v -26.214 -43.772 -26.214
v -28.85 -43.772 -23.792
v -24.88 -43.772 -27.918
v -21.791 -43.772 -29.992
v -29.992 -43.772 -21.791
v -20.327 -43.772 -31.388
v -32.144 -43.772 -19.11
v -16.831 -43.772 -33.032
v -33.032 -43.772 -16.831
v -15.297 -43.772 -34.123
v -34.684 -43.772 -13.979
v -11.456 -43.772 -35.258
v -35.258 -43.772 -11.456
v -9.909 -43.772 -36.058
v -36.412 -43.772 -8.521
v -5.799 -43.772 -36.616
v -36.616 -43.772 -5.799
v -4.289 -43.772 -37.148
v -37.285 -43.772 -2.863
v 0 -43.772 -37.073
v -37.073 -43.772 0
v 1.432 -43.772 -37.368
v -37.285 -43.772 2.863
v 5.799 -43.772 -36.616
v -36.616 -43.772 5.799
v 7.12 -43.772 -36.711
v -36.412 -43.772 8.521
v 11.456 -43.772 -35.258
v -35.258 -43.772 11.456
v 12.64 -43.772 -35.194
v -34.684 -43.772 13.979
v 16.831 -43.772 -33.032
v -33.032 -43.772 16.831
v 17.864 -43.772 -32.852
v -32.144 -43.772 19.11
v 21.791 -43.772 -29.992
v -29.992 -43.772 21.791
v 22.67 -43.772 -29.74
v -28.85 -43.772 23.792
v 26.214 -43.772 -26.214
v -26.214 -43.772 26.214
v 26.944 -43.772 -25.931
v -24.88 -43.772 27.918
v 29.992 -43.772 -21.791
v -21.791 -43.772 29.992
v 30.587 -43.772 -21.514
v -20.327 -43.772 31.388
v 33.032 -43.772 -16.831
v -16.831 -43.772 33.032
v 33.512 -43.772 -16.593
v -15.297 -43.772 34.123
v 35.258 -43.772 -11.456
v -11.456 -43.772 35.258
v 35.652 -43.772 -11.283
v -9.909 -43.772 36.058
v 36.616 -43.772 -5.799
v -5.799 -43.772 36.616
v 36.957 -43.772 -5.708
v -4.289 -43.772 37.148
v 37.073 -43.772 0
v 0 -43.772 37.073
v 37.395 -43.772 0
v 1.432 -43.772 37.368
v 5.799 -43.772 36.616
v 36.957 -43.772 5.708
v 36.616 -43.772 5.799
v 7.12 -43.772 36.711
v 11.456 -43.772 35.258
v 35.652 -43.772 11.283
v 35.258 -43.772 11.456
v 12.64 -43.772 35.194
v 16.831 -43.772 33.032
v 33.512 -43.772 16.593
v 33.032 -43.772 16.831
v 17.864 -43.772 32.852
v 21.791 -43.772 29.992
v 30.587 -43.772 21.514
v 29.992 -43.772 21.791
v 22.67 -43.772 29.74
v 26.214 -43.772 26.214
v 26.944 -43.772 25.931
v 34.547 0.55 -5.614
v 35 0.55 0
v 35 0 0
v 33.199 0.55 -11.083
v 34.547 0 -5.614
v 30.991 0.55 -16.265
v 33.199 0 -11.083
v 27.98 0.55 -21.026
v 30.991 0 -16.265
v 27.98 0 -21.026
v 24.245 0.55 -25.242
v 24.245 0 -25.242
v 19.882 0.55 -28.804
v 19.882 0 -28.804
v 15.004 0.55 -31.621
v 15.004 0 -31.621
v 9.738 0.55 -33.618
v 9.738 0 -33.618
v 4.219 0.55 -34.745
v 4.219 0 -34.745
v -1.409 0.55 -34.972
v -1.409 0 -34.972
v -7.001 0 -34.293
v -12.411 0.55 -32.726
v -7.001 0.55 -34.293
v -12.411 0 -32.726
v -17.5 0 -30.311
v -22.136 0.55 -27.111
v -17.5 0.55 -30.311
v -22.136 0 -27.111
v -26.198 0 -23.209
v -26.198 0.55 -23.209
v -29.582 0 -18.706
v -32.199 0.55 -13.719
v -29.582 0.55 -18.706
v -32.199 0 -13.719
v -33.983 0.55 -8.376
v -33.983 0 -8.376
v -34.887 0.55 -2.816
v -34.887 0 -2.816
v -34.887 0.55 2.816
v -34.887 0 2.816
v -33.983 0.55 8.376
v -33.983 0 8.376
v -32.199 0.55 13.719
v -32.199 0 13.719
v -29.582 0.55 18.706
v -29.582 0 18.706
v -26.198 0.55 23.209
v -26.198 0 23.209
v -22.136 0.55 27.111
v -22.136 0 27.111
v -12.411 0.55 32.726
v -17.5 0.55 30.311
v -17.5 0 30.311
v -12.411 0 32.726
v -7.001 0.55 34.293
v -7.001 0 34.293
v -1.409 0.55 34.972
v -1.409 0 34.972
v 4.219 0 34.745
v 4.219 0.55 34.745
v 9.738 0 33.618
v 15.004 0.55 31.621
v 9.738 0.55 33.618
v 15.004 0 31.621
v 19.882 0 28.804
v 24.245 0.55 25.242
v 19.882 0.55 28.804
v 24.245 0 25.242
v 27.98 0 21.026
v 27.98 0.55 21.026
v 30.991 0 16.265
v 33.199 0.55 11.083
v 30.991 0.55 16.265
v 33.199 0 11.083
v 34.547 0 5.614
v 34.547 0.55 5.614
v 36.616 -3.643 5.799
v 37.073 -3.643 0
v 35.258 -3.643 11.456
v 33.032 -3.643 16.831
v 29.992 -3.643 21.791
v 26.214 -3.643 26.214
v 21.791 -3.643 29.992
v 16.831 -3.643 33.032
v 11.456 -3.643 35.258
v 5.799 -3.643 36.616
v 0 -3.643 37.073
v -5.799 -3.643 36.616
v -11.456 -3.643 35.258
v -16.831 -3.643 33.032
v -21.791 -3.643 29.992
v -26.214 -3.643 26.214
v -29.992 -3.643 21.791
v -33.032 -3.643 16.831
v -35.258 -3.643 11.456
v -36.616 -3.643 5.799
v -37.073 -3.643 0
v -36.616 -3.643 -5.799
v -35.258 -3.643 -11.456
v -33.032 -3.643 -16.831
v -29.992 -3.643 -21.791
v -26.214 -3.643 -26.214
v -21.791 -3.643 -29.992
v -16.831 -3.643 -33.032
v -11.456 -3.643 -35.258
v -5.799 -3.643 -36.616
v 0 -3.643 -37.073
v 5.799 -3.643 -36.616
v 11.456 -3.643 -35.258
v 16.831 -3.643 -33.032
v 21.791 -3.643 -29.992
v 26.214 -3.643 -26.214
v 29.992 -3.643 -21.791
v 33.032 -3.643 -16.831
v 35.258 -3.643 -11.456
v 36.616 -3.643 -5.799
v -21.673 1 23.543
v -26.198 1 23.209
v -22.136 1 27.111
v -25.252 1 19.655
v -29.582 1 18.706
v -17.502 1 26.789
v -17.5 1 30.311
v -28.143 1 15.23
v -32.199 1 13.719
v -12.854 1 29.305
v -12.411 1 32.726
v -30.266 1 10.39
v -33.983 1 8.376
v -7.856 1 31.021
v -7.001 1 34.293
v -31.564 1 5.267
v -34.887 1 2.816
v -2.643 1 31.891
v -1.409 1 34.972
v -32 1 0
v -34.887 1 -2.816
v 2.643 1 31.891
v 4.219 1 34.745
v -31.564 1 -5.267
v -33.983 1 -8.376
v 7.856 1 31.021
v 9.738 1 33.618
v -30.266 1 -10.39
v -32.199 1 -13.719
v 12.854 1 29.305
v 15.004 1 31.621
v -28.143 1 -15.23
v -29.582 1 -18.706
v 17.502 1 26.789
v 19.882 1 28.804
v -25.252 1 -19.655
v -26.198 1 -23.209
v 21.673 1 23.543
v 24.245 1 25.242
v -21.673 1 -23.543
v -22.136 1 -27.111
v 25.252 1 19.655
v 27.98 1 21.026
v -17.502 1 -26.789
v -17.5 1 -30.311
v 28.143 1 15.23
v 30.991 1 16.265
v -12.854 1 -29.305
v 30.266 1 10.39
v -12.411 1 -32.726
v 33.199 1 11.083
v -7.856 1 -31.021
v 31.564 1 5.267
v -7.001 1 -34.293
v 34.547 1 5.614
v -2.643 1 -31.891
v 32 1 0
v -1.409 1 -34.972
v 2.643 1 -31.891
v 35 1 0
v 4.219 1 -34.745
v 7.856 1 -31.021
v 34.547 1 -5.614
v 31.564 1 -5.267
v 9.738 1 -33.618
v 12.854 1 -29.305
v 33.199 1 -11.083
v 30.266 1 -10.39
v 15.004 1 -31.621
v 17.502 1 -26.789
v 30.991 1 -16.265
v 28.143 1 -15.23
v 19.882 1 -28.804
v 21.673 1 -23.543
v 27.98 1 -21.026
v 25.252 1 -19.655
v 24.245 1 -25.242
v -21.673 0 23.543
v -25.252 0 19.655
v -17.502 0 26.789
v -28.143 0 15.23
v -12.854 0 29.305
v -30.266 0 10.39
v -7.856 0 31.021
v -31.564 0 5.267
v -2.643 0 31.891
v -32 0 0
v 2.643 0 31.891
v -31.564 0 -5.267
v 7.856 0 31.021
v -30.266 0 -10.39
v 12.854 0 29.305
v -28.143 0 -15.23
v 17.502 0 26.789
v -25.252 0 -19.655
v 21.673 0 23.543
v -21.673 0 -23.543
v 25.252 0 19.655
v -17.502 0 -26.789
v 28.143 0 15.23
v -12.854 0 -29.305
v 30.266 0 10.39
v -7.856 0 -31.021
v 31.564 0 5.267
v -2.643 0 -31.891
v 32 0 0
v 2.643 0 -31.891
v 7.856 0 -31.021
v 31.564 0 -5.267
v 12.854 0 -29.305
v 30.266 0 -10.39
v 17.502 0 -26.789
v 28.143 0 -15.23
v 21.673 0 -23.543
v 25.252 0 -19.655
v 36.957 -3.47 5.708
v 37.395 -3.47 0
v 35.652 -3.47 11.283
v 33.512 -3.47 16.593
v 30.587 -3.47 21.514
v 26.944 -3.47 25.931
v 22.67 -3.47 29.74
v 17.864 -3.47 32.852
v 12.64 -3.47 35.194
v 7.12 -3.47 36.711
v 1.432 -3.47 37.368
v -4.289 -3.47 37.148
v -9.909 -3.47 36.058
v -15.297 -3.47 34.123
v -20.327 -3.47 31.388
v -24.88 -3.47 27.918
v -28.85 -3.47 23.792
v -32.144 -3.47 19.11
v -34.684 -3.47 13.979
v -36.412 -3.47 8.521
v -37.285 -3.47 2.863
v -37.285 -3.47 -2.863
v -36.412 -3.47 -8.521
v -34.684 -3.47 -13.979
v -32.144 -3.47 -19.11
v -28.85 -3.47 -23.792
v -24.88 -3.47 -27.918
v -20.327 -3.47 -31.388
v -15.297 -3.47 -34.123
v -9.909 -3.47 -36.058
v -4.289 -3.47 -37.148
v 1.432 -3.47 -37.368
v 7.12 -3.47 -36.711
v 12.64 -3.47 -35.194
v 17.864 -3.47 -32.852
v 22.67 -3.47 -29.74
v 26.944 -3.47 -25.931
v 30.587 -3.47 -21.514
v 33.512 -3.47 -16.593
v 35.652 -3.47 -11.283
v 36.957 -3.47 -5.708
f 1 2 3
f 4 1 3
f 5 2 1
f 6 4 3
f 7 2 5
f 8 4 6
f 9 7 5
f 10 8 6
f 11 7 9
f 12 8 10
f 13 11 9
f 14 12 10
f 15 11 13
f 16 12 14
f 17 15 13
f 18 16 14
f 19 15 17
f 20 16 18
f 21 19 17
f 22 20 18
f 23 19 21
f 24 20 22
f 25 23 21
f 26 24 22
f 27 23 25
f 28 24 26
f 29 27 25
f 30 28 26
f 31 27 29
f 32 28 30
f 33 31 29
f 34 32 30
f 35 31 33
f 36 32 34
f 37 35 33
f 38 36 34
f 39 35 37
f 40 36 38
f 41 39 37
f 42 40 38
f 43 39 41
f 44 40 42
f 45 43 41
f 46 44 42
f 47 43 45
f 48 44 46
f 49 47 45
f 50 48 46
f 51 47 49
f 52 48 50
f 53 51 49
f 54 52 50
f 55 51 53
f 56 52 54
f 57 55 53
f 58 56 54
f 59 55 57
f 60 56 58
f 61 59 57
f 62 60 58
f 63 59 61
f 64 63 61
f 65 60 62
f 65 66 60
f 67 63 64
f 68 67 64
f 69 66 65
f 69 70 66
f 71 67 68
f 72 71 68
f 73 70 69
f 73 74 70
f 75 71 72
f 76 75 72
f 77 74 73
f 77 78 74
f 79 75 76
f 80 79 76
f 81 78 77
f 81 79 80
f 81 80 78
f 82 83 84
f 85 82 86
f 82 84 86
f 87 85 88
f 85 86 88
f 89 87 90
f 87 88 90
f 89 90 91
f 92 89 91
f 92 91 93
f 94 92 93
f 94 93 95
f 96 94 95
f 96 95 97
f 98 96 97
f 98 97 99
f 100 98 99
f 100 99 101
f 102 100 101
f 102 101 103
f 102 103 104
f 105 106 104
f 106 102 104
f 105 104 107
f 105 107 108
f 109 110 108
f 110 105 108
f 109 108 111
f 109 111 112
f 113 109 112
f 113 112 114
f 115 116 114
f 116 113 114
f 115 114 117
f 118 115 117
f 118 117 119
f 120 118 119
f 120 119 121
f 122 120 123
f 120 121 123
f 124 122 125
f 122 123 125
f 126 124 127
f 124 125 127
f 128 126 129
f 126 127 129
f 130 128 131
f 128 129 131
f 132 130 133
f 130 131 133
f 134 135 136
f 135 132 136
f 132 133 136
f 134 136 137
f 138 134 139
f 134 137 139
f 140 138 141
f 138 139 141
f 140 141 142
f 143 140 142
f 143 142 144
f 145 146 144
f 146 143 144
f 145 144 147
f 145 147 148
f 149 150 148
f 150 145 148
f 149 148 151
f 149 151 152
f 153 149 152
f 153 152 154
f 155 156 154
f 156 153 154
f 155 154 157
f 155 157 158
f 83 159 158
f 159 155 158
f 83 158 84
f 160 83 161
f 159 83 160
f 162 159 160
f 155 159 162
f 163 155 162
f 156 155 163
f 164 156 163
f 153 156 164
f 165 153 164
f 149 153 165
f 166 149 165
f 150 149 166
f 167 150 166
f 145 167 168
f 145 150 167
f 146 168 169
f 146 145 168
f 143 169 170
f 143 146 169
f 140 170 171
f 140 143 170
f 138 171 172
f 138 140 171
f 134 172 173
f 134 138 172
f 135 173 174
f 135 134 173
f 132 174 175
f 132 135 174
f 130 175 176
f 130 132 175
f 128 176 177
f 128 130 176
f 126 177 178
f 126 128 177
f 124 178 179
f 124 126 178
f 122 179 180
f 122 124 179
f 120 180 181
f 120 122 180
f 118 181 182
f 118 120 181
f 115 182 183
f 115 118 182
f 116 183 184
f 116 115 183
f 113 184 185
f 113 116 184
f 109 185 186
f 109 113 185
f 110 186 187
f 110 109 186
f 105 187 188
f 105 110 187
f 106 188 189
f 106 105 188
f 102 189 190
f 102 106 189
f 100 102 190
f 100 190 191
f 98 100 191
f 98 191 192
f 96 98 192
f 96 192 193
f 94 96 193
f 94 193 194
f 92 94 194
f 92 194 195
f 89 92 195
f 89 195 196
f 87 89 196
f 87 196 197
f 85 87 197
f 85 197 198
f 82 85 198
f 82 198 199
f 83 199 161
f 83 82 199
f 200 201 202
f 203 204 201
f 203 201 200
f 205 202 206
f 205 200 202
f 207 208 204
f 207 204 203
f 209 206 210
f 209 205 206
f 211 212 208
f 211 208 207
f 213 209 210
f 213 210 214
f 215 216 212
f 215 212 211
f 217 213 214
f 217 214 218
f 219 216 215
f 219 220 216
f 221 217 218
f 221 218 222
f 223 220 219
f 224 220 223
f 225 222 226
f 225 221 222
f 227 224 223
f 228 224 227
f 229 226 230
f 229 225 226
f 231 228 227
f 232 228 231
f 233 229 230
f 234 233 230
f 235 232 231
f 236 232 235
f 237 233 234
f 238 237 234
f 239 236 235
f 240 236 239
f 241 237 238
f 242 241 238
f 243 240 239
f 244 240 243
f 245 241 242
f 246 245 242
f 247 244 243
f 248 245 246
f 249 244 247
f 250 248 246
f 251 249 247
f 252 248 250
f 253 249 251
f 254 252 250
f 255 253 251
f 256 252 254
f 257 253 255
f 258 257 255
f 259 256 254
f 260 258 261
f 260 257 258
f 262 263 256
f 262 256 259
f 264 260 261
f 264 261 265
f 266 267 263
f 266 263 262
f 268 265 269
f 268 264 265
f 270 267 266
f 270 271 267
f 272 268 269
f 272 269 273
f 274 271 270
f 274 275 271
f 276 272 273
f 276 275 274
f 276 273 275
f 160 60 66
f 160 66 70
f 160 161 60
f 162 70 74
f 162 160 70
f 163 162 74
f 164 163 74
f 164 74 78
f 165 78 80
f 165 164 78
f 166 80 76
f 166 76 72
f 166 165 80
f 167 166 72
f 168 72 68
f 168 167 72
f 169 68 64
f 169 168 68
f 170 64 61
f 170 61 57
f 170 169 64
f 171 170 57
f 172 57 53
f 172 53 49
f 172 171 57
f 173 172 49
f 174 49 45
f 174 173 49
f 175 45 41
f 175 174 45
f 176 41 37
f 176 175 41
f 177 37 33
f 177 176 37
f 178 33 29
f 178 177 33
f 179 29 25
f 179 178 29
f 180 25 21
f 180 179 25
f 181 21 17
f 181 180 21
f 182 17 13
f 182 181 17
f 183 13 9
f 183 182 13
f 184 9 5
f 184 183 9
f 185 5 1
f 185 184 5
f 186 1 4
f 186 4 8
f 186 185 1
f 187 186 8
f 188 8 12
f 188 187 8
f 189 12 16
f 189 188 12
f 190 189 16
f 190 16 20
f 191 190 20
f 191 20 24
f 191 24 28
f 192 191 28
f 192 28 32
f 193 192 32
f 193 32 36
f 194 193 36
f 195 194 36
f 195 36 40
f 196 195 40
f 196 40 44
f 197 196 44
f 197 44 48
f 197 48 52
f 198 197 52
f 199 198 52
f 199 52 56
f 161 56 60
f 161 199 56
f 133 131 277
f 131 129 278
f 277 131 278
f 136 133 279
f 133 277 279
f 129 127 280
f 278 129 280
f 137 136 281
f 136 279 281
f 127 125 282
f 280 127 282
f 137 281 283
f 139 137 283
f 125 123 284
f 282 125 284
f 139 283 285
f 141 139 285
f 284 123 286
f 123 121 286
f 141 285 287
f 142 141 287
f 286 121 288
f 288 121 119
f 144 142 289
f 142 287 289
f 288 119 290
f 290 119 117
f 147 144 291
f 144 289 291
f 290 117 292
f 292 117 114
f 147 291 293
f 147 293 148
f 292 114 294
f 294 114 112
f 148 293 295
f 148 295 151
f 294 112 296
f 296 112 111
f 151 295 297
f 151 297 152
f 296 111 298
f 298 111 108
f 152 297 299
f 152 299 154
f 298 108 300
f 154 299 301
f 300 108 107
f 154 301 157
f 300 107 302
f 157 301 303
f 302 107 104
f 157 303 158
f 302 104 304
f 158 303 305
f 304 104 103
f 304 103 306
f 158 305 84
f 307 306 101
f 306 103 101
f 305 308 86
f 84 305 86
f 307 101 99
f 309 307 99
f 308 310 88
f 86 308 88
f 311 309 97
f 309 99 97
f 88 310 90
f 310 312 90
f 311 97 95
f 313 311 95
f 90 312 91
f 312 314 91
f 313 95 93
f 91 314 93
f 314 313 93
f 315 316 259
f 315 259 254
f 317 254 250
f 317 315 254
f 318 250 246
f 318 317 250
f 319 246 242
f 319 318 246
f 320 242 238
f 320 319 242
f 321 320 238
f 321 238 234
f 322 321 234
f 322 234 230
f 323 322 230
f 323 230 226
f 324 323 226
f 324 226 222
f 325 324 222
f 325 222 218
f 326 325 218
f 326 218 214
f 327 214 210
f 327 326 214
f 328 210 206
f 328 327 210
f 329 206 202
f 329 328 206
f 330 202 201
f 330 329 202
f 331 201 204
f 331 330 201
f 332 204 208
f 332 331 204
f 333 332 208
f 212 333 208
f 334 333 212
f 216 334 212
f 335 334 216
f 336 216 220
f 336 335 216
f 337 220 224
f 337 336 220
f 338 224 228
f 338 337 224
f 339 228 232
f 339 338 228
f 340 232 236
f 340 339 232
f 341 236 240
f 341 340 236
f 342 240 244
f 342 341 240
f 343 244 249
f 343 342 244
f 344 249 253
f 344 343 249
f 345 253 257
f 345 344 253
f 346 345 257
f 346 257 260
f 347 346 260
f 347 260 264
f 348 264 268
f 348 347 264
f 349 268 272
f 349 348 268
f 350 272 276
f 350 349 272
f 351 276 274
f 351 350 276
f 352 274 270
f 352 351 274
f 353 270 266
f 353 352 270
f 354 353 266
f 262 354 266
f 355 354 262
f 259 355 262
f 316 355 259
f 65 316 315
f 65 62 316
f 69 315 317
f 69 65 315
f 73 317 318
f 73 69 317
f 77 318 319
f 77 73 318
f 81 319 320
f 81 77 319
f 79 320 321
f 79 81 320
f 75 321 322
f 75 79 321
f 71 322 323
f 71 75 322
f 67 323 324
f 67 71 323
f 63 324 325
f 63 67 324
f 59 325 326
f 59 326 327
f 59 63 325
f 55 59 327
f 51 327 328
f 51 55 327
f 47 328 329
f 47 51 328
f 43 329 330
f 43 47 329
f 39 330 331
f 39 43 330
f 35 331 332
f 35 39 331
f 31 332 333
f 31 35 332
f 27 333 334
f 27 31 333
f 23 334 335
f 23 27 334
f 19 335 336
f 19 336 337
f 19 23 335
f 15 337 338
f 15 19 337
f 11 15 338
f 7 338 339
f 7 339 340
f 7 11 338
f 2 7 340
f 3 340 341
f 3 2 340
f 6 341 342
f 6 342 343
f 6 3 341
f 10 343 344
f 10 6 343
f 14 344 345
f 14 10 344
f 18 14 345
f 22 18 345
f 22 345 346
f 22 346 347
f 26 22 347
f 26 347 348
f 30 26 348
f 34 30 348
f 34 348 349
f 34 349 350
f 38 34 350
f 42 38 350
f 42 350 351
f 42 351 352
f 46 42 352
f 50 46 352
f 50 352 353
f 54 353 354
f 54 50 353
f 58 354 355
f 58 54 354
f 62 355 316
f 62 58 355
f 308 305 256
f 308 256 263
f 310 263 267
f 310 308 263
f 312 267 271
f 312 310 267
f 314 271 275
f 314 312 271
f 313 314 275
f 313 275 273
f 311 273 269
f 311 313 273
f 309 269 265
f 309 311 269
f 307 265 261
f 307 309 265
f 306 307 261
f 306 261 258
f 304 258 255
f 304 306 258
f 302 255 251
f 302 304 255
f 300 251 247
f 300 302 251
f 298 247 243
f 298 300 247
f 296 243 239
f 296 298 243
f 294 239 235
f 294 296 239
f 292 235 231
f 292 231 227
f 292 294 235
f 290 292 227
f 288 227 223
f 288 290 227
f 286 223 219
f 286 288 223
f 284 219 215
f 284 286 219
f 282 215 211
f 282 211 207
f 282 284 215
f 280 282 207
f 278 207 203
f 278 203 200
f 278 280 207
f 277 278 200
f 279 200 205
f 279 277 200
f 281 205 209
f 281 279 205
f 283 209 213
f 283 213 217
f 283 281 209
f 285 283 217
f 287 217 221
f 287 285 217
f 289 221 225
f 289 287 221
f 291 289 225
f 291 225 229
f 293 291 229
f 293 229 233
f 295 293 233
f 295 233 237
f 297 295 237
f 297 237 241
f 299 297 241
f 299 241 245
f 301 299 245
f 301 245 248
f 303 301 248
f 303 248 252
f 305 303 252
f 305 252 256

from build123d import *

# Parameters (mm, degrees)
SKETCH_1_R      = 35
SKETCH_1_R_2    = 32
EXTRUDE_1_DEPTH = 1


with BuildPart() as part:
    # 草图1 → 凸台-拉伸1 (new body)
    with BuildSketch(Plane(origin=(0, 0, 0), x_dir=(1, 0, 0), z_dir=(0, 1, 0))):
        Circle(SKETCH_1_R)
        Circle(SKETCH_1_R_2, mode=Mode.SUBTRACT)
    extrude(amount=EXTRUDE_1_DEPTH)

    # 草图2 → 旋转1 (revolve)
    with BuildSketch(Plane.XY):
        Polygon((35, 1), (37.395208955, -3.470302207), (37.395208955, -43.771735553), (37.072710077, -43.771735553), (37.072710077, -3.643098623), (35, 0.549668864), align=None)
    revolve(axis=Axis((0, 0, 0), (0, -1, 0)))


solid = part.part
